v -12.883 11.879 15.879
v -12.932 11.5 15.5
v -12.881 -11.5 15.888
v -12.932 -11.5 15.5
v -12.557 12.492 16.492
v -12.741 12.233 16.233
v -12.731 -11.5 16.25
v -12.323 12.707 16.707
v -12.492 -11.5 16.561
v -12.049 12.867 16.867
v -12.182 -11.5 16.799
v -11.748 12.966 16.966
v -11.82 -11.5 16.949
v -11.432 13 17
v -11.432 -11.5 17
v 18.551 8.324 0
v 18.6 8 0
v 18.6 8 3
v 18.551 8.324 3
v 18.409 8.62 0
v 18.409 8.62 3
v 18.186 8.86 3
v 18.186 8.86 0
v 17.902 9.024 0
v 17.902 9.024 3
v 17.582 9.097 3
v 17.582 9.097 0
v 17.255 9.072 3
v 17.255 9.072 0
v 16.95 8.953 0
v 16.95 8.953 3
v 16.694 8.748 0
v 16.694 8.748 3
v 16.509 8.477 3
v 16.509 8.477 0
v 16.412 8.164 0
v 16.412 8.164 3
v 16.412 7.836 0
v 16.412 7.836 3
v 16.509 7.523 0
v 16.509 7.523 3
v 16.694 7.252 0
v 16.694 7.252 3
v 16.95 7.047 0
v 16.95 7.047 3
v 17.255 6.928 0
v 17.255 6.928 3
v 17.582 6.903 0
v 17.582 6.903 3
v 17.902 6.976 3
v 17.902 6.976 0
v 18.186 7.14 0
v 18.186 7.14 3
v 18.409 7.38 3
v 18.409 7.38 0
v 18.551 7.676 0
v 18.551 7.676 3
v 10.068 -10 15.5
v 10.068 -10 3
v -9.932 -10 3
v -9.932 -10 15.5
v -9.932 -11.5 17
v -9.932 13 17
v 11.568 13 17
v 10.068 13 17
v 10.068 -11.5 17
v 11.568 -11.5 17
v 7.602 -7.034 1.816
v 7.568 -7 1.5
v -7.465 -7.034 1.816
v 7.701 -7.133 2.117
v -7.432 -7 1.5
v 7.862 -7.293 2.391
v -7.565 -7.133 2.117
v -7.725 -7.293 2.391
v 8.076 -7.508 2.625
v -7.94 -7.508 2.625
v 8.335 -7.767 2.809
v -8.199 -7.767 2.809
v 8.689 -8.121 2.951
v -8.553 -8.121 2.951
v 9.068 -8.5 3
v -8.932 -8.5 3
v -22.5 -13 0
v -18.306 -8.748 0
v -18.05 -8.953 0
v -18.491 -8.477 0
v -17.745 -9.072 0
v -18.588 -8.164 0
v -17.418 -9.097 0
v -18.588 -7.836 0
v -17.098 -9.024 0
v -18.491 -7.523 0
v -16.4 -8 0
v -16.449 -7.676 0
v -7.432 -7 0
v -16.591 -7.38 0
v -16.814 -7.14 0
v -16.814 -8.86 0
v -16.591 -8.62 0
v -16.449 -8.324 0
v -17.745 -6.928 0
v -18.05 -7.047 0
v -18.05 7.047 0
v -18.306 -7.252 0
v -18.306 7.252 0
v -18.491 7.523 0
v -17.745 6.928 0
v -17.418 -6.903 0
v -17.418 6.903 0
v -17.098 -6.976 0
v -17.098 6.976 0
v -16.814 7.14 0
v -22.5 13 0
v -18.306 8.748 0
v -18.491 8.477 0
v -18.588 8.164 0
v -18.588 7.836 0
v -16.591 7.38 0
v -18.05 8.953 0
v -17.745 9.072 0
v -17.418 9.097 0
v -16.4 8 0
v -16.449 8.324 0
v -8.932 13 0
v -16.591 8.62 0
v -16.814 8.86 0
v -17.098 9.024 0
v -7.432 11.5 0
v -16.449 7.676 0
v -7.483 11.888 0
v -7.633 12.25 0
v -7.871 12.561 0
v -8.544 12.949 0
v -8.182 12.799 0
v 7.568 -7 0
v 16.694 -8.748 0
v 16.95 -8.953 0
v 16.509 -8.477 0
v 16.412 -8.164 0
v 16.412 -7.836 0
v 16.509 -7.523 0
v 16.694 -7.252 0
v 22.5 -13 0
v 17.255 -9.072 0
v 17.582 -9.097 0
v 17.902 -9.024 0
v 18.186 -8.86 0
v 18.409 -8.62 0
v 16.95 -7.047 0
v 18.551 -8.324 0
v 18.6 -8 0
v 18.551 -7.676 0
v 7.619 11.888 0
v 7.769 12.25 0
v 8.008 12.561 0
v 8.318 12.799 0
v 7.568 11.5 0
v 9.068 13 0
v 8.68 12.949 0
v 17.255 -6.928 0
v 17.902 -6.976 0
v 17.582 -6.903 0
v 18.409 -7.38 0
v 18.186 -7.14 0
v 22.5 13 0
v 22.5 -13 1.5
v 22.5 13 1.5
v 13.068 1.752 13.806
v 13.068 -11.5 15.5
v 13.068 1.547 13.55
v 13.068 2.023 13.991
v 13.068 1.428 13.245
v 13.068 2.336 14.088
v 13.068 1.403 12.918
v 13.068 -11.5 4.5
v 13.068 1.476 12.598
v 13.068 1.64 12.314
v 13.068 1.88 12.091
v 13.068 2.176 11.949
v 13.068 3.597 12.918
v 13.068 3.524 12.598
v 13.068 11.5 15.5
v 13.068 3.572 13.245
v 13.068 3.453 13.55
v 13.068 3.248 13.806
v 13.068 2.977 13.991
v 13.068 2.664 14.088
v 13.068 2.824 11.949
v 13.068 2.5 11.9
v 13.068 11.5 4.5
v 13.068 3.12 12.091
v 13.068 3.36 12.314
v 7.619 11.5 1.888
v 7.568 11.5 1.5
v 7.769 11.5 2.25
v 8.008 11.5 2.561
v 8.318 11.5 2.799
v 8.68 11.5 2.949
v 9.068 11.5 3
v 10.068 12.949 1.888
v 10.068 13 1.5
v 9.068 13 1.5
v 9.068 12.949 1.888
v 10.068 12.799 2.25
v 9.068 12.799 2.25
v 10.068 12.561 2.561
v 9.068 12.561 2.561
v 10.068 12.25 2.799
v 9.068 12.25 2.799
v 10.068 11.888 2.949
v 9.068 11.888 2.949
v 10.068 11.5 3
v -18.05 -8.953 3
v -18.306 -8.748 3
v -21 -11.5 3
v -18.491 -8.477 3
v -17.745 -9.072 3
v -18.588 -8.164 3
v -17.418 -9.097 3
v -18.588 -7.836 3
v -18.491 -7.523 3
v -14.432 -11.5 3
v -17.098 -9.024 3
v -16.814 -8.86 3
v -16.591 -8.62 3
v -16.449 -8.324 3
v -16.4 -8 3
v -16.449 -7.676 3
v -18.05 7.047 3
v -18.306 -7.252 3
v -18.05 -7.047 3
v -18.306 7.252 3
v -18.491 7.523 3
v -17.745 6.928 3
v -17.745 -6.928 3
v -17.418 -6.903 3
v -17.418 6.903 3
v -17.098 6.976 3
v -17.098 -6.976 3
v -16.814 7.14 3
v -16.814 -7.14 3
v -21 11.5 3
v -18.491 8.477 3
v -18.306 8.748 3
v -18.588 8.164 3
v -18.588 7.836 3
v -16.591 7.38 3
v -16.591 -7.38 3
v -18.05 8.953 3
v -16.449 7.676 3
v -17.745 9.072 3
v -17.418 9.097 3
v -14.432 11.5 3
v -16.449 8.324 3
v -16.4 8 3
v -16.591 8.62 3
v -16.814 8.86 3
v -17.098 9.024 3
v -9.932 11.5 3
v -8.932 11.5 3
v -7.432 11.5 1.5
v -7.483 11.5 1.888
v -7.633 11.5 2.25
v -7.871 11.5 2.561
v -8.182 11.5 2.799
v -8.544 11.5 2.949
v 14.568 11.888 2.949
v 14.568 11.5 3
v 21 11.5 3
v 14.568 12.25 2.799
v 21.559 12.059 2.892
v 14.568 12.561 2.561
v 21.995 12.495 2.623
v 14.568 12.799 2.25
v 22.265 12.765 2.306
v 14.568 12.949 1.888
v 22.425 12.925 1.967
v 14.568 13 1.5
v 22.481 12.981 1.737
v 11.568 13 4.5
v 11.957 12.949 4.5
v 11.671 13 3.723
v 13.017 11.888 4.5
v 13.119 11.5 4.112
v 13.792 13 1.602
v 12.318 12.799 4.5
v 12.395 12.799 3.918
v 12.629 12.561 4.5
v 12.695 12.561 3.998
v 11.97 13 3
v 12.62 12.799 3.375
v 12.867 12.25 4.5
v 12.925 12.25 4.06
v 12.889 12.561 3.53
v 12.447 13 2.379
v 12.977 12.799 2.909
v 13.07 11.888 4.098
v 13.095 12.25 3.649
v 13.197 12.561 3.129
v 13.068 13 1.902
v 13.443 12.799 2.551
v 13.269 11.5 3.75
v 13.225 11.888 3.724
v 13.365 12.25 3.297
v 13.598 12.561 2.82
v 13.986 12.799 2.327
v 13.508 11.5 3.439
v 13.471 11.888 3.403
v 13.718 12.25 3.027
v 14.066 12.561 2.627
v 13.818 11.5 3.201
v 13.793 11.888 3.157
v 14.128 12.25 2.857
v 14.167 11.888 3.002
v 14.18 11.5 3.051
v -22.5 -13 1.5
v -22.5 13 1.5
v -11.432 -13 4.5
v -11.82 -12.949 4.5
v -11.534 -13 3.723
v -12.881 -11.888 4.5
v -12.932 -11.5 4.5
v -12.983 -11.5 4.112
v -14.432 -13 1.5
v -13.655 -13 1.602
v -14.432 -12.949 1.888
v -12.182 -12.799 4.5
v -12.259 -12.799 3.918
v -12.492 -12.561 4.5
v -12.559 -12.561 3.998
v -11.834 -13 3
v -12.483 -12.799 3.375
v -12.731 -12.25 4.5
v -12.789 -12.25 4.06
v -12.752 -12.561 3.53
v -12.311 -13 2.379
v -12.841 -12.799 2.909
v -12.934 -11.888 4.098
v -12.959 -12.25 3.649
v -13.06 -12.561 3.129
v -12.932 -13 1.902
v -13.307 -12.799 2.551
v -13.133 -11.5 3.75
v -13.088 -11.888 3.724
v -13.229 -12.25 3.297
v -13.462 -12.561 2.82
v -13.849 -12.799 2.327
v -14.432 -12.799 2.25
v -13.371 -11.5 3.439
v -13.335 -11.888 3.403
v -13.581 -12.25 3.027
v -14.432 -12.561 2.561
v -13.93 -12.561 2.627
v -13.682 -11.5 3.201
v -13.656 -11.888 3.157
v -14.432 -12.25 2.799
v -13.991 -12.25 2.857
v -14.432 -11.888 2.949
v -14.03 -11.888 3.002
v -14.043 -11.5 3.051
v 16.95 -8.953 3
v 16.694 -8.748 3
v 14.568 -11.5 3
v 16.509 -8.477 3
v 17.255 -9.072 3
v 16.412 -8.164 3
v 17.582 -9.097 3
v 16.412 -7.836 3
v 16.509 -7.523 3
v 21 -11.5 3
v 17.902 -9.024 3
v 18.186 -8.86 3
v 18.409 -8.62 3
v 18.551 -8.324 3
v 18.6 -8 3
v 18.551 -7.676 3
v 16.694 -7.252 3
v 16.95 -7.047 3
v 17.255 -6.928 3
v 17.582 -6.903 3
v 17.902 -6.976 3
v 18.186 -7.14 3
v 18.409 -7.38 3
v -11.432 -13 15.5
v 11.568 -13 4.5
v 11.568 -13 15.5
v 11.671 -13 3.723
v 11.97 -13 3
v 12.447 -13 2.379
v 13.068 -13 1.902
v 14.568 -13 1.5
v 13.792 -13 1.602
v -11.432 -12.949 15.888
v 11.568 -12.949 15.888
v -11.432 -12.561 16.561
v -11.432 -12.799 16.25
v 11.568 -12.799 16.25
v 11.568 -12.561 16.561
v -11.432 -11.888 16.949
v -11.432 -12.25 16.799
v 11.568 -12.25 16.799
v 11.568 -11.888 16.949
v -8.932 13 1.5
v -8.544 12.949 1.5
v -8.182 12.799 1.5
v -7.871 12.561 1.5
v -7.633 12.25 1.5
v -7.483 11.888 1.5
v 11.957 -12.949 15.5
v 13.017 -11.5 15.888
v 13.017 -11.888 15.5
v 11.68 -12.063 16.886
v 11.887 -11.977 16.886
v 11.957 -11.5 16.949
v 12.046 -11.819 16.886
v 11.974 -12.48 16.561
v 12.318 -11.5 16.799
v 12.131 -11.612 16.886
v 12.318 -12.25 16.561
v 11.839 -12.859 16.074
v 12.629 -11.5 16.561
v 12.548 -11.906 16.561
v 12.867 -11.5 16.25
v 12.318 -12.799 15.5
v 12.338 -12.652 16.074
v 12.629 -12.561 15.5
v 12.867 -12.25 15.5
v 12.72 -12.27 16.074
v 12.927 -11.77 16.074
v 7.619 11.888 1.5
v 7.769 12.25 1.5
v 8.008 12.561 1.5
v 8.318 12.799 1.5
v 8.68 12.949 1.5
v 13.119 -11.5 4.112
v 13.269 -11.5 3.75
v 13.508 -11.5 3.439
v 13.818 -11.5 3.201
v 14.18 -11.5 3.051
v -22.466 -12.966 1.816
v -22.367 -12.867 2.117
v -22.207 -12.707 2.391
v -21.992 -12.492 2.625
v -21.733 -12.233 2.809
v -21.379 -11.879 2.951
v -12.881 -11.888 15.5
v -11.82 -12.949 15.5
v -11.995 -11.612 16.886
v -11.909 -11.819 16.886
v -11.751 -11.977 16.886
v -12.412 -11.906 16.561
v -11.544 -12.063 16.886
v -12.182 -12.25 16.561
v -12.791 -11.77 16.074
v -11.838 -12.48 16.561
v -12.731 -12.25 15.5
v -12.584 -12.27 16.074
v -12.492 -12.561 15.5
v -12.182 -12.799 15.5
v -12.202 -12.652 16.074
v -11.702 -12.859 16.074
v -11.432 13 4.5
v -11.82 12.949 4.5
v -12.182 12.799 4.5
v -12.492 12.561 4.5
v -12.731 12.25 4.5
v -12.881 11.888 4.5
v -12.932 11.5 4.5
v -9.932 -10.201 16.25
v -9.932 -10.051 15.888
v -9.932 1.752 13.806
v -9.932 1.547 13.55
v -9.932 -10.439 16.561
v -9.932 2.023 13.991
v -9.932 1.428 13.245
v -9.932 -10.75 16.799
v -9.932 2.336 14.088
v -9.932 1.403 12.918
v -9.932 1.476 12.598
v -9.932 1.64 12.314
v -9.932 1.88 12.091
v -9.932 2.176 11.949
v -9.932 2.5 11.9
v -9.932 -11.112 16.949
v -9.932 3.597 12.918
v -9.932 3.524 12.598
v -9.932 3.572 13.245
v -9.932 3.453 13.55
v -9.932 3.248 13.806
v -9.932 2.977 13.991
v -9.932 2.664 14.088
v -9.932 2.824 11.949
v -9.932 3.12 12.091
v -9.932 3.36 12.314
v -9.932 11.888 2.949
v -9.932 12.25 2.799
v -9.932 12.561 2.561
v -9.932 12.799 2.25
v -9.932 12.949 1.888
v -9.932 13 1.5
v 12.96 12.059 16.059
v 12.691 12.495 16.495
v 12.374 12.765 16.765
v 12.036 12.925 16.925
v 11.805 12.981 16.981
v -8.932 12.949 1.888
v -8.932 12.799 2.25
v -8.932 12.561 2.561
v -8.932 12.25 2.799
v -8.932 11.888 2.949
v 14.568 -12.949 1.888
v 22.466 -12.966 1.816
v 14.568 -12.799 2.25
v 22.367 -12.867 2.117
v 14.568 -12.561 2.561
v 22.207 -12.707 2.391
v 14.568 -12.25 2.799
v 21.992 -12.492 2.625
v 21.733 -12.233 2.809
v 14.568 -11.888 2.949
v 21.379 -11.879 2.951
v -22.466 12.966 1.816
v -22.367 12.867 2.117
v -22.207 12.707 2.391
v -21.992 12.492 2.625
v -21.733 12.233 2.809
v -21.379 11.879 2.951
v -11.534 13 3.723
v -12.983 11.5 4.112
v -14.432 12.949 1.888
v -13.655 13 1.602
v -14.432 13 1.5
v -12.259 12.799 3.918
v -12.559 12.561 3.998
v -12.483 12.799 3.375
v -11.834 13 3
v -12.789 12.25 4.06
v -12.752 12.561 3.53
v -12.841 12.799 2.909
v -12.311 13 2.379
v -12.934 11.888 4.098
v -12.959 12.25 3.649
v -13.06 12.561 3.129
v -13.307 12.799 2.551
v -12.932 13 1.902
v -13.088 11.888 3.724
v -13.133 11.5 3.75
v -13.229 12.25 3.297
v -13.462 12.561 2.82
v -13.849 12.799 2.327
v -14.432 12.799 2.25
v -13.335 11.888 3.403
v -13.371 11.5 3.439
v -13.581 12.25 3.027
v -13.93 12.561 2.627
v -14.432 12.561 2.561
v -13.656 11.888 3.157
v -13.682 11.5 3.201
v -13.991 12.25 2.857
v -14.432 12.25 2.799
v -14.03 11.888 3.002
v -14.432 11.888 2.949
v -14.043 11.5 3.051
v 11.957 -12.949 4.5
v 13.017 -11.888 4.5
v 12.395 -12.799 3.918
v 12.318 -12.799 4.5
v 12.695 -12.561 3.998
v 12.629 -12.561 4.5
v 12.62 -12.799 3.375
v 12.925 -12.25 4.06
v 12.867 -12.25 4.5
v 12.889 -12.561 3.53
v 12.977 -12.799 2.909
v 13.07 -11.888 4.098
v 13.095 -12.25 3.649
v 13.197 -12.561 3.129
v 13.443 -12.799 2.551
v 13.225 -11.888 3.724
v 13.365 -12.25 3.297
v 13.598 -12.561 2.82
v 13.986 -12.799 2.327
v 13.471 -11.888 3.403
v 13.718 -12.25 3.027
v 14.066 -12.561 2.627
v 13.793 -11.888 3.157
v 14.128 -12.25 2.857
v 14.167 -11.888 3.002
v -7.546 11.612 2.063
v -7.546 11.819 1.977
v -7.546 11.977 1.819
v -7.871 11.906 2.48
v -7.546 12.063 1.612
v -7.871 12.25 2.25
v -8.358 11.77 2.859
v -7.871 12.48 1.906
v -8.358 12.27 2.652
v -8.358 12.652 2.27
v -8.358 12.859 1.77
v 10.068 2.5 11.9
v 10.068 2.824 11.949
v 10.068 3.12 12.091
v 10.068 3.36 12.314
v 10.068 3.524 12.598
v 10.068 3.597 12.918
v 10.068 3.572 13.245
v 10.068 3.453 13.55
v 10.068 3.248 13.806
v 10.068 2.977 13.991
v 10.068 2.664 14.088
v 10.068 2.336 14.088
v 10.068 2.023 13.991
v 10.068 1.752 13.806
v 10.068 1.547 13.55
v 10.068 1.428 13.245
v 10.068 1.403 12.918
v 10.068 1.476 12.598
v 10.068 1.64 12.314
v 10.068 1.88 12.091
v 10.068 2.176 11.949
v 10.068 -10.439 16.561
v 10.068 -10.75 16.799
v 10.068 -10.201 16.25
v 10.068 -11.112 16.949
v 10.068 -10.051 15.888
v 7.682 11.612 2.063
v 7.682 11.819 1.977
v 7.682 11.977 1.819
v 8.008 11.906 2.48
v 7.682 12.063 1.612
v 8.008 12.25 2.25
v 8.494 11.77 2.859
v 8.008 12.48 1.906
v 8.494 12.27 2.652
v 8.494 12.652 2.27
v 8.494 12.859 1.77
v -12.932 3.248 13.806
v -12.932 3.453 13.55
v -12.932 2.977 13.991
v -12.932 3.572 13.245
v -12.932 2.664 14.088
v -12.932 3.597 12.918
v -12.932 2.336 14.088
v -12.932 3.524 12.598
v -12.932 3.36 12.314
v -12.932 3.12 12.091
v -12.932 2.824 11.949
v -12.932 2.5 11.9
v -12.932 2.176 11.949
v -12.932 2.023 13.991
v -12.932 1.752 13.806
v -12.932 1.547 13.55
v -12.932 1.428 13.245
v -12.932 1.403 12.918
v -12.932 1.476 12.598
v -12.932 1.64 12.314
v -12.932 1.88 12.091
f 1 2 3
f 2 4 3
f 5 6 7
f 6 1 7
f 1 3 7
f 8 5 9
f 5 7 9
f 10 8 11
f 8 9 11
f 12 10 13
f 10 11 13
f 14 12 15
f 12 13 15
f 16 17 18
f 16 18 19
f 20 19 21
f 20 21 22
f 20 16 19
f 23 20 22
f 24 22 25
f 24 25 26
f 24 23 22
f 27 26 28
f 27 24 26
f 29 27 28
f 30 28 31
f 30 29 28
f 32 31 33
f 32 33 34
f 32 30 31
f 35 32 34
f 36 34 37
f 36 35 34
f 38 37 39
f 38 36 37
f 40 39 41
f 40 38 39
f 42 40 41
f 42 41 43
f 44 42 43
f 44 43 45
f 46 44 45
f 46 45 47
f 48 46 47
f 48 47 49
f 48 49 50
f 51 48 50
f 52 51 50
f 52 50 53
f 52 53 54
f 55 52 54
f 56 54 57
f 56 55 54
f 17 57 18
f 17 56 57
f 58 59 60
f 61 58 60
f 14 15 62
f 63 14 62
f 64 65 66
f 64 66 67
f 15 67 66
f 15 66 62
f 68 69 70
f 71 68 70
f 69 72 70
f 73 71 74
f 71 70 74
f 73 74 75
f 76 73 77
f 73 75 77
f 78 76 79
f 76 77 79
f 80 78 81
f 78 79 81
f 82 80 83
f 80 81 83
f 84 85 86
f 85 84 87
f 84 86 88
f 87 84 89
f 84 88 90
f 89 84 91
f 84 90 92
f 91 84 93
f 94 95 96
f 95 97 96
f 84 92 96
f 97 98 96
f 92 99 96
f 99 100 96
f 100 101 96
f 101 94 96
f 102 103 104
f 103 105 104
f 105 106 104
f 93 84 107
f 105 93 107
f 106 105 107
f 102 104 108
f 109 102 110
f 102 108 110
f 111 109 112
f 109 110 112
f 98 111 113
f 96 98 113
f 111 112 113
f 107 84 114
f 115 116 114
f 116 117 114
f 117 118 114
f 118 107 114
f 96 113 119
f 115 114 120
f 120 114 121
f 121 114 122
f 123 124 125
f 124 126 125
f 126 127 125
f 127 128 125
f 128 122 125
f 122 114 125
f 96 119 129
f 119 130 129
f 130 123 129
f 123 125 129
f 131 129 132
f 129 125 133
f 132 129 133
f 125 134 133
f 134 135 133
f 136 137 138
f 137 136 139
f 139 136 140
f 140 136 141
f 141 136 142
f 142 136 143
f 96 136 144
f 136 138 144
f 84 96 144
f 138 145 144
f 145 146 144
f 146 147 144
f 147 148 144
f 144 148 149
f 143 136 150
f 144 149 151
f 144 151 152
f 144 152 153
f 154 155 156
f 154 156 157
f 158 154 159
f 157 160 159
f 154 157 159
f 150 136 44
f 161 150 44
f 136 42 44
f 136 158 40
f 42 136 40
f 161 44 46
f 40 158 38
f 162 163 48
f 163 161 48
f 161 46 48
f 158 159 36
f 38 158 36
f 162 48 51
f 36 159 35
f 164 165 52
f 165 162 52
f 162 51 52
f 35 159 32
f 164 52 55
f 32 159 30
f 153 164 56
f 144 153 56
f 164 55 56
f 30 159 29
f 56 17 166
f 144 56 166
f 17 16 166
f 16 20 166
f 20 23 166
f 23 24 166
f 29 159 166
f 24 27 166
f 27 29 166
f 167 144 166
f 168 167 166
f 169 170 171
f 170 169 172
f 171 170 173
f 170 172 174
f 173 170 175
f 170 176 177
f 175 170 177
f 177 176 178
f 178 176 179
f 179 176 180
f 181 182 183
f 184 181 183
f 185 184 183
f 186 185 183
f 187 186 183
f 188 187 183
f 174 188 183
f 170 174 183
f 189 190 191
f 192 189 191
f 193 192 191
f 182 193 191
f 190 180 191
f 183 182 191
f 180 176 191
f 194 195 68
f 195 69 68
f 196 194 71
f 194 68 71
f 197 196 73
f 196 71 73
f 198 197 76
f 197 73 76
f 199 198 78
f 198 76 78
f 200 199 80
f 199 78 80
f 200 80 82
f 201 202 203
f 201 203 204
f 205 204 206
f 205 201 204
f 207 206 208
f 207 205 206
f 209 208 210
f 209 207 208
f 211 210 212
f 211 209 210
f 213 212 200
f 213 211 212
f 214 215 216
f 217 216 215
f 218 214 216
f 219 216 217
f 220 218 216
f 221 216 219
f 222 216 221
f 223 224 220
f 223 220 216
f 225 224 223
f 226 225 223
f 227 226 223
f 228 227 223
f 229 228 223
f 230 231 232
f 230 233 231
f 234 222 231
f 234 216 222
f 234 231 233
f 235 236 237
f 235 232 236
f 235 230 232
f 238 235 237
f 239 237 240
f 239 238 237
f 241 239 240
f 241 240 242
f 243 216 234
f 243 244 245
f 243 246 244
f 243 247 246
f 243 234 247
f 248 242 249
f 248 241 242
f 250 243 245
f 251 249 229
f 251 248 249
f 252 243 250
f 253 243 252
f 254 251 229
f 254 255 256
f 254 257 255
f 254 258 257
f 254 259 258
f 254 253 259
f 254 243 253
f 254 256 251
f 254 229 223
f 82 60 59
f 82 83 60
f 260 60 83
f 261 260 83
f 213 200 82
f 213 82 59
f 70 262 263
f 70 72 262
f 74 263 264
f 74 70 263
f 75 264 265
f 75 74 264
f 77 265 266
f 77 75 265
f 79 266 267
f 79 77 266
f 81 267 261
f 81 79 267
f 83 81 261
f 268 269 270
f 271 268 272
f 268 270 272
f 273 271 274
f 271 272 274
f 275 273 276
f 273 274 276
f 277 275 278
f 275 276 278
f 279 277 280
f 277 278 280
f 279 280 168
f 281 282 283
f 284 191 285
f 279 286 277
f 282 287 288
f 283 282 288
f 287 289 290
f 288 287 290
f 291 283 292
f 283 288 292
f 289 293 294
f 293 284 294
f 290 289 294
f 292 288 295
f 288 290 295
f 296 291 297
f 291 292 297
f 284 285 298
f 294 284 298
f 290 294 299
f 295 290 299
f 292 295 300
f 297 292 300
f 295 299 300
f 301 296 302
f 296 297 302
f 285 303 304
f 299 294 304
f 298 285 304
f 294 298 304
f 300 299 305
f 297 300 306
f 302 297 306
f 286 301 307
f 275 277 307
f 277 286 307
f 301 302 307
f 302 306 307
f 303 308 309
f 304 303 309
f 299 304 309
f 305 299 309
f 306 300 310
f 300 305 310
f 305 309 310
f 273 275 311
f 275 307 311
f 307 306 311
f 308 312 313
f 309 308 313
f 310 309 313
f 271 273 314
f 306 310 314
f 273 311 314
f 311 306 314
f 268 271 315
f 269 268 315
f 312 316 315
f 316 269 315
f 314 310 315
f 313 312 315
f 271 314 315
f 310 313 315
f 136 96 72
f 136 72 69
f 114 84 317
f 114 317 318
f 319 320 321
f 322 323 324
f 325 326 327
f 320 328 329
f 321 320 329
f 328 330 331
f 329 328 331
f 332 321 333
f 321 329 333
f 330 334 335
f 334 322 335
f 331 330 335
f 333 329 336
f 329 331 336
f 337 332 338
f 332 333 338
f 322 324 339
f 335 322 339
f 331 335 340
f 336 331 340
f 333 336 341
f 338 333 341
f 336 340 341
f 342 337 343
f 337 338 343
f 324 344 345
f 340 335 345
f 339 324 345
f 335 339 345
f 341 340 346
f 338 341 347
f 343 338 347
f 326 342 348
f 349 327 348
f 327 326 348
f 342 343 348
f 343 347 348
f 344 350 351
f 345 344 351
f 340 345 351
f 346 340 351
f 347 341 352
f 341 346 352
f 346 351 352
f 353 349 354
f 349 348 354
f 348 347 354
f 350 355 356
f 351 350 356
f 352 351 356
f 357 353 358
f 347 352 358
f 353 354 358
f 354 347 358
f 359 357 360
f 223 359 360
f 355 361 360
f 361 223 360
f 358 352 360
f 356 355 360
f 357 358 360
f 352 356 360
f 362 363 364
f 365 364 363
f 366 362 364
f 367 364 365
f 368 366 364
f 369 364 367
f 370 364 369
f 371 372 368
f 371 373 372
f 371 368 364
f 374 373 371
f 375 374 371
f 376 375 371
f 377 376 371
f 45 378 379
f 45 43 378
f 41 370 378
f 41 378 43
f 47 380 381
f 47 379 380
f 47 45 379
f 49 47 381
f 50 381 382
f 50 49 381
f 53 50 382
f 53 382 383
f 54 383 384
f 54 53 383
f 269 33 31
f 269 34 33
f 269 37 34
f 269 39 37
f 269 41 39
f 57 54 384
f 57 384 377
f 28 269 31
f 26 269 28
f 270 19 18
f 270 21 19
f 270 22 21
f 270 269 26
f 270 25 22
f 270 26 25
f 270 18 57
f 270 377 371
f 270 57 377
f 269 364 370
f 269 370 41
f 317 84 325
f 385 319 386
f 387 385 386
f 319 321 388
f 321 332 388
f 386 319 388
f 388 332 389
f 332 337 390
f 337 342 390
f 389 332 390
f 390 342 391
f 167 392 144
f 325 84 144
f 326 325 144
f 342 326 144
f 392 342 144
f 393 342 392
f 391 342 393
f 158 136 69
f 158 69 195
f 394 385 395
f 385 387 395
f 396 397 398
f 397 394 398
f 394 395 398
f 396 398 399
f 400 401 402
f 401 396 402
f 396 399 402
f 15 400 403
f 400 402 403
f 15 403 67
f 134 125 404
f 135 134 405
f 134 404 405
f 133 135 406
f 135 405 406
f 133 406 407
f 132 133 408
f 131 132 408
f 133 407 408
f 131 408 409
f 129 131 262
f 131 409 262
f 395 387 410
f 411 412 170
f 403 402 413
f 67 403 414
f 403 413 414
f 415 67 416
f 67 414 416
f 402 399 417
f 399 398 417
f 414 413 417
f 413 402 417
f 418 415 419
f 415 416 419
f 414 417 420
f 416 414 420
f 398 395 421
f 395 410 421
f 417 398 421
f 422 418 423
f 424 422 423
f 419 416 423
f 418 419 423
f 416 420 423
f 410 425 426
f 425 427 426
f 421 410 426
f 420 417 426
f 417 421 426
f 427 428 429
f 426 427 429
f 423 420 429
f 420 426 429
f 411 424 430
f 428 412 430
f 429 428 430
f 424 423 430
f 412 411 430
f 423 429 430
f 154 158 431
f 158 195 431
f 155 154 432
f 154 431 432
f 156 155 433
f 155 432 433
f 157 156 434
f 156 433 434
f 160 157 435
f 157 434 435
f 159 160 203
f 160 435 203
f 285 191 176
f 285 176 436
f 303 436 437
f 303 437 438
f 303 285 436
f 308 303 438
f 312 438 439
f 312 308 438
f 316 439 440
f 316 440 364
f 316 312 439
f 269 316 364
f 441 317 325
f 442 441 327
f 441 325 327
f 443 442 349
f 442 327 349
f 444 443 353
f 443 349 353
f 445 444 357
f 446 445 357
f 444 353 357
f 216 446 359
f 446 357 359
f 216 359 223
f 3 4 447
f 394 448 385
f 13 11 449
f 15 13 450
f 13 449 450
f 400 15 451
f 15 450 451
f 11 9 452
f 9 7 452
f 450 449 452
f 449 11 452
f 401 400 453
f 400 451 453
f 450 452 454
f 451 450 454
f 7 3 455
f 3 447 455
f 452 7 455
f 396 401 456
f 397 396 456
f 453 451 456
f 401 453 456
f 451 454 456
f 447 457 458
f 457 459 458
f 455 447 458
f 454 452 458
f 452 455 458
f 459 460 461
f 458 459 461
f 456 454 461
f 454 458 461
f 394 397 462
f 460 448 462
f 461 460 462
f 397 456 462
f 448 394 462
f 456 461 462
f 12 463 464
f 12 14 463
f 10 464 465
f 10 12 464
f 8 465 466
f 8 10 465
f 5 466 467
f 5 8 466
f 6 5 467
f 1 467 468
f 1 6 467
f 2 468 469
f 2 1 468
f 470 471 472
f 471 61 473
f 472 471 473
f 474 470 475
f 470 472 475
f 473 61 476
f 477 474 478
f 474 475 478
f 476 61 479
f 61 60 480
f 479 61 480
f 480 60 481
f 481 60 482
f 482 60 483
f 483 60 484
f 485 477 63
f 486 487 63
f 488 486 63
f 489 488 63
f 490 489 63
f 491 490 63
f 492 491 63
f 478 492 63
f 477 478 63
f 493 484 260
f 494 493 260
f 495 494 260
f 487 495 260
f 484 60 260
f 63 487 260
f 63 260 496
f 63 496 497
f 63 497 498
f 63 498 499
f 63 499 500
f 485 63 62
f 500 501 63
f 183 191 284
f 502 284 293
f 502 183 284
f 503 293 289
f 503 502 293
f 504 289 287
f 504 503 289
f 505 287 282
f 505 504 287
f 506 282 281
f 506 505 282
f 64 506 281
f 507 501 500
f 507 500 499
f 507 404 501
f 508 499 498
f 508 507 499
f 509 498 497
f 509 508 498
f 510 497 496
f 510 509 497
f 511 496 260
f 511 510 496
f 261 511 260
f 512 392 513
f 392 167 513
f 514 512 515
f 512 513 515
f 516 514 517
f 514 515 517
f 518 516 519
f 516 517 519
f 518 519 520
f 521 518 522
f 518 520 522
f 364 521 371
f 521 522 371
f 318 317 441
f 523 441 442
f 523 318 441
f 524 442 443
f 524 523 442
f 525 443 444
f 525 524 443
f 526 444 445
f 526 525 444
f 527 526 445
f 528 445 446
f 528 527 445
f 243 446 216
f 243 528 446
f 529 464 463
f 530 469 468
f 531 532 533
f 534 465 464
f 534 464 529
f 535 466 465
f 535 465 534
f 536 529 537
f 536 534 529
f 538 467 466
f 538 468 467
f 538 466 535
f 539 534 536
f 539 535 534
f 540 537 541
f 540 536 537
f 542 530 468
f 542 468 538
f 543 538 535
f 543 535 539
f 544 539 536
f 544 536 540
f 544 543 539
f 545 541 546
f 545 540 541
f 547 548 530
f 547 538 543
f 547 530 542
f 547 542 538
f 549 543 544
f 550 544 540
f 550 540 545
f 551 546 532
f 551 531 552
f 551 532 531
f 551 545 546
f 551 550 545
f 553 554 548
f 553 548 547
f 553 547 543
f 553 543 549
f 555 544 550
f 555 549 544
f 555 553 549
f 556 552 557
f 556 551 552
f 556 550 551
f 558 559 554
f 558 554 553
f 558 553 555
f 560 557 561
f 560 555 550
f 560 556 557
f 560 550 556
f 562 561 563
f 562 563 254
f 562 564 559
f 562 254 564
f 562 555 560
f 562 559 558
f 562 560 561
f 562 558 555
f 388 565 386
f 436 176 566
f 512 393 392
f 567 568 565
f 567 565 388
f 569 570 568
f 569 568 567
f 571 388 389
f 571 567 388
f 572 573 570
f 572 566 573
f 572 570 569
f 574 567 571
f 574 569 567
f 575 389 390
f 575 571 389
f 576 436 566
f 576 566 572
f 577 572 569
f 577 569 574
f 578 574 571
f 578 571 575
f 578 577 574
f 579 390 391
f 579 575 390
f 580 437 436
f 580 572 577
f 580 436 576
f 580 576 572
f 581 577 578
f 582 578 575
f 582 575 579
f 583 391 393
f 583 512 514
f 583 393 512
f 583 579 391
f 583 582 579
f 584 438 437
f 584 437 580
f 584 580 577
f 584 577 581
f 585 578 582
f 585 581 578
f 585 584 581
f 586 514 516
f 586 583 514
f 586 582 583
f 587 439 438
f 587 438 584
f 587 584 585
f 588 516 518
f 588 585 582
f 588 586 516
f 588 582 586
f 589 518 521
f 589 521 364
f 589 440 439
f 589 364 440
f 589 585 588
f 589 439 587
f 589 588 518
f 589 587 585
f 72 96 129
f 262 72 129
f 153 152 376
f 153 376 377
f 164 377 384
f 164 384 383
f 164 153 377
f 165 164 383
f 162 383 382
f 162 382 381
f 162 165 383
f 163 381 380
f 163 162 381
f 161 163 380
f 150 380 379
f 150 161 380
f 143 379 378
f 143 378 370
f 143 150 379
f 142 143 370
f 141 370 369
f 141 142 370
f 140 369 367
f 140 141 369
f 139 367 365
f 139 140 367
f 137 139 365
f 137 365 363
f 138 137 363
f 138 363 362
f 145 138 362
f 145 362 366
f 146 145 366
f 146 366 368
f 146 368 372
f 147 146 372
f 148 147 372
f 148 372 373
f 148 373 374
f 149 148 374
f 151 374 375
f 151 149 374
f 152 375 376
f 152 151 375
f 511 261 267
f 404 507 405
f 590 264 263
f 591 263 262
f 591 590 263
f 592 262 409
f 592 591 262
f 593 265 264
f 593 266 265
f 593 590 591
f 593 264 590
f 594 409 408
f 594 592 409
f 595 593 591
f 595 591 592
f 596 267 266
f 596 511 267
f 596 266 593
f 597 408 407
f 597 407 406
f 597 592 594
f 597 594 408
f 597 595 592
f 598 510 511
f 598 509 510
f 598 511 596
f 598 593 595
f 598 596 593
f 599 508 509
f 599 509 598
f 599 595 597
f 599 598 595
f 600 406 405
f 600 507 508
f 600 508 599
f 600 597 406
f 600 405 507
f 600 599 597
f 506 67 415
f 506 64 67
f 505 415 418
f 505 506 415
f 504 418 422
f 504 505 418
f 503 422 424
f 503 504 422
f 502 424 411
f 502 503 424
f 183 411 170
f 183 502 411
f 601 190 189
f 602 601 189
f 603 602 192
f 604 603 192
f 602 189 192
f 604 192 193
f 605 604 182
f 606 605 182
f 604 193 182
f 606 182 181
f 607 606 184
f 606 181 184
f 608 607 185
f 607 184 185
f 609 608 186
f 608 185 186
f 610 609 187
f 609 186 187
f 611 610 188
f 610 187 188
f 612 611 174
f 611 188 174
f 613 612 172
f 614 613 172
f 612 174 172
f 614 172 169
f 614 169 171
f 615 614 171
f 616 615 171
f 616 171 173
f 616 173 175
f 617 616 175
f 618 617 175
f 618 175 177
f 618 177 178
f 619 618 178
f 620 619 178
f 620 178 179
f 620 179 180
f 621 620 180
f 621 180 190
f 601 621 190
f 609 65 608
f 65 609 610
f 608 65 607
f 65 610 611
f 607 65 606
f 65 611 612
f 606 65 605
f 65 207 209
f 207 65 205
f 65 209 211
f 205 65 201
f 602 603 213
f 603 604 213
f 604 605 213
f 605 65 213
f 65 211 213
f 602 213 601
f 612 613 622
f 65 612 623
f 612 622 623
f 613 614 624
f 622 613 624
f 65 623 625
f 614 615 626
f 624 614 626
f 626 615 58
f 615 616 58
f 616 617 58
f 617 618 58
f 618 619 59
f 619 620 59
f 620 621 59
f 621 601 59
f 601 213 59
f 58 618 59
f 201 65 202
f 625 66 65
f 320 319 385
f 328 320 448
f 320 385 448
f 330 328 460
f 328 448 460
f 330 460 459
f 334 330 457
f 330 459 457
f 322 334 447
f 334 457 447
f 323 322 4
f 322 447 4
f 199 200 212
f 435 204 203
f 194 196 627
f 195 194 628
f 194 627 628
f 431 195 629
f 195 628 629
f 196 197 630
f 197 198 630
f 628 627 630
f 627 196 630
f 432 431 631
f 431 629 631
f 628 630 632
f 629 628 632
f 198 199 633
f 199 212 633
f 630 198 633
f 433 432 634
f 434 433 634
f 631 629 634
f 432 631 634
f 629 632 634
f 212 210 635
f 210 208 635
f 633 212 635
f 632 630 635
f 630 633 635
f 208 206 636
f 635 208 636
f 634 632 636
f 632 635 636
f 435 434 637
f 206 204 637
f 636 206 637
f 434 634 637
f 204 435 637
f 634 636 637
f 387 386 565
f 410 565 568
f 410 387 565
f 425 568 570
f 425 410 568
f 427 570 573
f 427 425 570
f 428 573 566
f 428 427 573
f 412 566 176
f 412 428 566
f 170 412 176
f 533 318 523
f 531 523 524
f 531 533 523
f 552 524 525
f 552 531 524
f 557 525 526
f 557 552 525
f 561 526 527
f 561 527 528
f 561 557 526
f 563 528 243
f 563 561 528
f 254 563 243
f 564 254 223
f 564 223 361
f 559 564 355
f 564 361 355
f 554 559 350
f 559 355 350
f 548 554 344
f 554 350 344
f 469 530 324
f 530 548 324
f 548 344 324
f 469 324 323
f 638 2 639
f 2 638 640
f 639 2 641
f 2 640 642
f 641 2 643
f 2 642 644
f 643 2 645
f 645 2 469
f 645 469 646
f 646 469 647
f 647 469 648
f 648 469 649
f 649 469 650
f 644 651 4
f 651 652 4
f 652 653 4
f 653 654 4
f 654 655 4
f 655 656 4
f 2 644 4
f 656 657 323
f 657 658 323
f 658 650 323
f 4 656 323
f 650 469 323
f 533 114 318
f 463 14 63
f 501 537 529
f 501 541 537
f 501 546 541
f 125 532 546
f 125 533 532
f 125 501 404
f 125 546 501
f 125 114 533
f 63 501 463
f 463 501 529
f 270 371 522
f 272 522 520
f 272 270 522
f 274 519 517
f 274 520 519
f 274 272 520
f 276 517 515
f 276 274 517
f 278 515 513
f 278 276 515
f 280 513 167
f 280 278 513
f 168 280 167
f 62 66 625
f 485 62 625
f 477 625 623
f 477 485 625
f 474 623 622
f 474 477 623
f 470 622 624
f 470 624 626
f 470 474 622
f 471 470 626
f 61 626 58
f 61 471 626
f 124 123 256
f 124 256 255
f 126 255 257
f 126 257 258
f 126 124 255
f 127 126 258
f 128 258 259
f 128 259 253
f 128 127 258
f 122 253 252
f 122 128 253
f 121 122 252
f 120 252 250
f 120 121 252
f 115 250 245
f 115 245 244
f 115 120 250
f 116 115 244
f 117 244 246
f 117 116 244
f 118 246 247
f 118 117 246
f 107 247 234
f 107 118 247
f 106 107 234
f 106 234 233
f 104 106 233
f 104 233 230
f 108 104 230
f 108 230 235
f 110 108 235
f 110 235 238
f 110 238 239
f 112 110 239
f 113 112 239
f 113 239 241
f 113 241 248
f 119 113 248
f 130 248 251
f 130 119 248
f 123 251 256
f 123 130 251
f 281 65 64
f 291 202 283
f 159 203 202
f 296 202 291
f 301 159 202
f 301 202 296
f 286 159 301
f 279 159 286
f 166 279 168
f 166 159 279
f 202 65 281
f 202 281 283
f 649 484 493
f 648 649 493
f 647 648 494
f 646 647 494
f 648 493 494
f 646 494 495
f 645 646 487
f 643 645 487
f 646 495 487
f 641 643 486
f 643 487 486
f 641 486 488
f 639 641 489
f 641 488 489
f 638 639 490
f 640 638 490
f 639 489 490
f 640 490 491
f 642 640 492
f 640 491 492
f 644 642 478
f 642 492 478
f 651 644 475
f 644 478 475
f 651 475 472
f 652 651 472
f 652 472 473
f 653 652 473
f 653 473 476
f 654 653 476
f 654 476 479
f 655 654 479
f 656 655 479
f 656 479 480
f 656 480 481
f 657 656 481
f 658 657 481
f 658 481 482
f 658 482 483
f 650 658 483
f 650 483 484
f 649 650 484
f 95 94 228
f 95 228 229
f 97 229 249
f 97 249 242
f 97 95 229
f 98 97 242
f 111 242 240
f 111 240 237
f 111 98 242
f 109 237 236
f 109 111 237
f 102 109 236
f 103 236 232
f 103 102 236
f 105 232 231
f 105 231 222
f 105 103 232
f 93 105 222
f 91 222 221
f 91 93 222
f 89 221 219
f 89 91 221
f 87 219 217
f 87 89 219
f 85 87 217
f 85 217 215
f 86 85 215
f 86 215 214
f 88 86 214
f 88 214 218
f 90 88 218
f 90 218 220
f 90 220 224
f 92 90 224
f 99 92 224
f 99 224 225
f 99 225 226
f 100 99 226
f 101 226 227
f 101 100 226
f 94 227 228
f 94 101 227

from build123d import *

# Parameters (mm, degrees)
SKETCH1_W                    = 45
SKETCH1_H                    = 26
BOSS_EXTRUDE5_DEPTH          = 3
BOSS_EXTRUDE6_DEPTH          = 14
CUT_EXTRUDE1_DEPTH           = 30.516944286
CUT_EXTRUDE1_DEPTH_BACK      = 30.516944286
SKETCH9_W                    = 15
SKETCH9_H                    = 20
M2_CLEARANCE_HOLE2_OUTLINE_R = 1.1
M2_CLEARANCE_HOLE2_DEPTH     = 3
M2_CLEARANCE_HOLE3_D         = 2.2
FILLET1_R                    = 1.5
FILLET2_R                    = 1.5


# Read off the part's stored shape, not the designer's step: M2 Clearance Hole2
with BuildPart() as part:
    # Sketch1 → Boss-Extrude5 (new body)
    with BuildSketch(Plane.XY):
        Rectangle(SKETCH1_W, SKETCH1_H)
    extrude(amount=BOSS_EXTRUDE5_DEPTH)

    # Sketch8 → Boss-Extrude6 (add)
    with BuildSketch(Plane.XY.offset(3)):
        Polygon((-9.931802589, -10), (-9.931802589, 13), (-12.931802589, 13), (-12.931802589, -13), (13.068197411, -13), (13.068197411, 13), (10.068197411, 13), (10.068197411, -10), align=None)
    extrude(amount=BOSS_EXTRUDE6_DEPTH)

    # Sketch9 → Cut-Extrude1 (cut, two sides: drawn at the far end of the back side and taken through both)
    with BuildSketch(Plane.XY.offset(3).offset(-CUT_EXTRUDE1_DEPTH_BACK)):
        with Locations((0.068197411, 3)):
            Rectangle(SKETCH9_W, SKETCH9_H)
    extrude(amount=CUT_EXTRUDE1_DEPTH + CUT_EXTRUDE1_DEPTH_BACK, mode=Mode.SUBTRACT)

    # M2 Clearance Hole2 outline → M2 Clearance Hole2 (cut)
    with BuildSketch(Plane.XY):
        with Locations((17.5, 8)):
            Circle(M2_CLEARANCE_HOLE2_OUTLINE_R)
        with Locations((-17.5, -8)):
            Circle(M2_CLEARANCE_HOLE2_OUTLINE_R)
        with Locations((-17.5, 8)):
            Circle(M2_CLEARANCE_HOLE2_OUTLINE_R)
        with Locations((17.5, -8)):
            Circle(M2_CLEARANCE_HOLE2_OUTLINE_R)
    extrude(amount=M2_CLEARANCE_HOLE2_DEPTH, mode=Mode.SUBTRACT)

    # M2 Clearance Hole3 (through all)
    with Locations(Plane.ZY.offset(12.931802589)):
        with Locations((13, 2.5)):
            Hole(M2_CLEARANCE_HOLE3_D / 2)

    # Fillet1
    fillet1_edges = [part.edges().sort_by_distance(p)[0] for p in [
        (-22.5, 0, 3),
        (-17.715901295, 13, 3),
        (17.784098705, -13, 3),
        (-17.715901295, -13, 3),
        (-12.931802589, 0, 3),
        (-12.931802589, 13, 10),
        (-12.931802589, -13, 10),
        (13.068197411, 0, 3),
        (13.068197411, -13, 10),
        (13.068197411, 13, 10),
        (-12.931802589, 0, 17),
        (0.068197411, -13, 17),
        (13.068197411, 0, 17),
        (0.068197411, -10, 17),
        (22.5, 0, 3),
        (17.784098705, 13, 3),
    ]]
    fillet(fillet1_edges, radius=FILLET1_R - 0.0001)  # a hair under: the kernel refuses the full size

    # Fillet2
    fillet2_edges = [part.edges().sort_by_distance(p)[0] for p in [
        (8.818197411, 13, 3),
        (-8.681802589, 13, 3),
        (7.568197411, 3, 3),
        (0.068197411, -7, 3),
        (-7.431802589, 3, 3),
        (-7.431802589, 13, 1.5),
        (7.568197411, 13, 1.5),
    ]]
    fillet(fillet2_edges, radius=FILLET2_R)


solid = part.part
